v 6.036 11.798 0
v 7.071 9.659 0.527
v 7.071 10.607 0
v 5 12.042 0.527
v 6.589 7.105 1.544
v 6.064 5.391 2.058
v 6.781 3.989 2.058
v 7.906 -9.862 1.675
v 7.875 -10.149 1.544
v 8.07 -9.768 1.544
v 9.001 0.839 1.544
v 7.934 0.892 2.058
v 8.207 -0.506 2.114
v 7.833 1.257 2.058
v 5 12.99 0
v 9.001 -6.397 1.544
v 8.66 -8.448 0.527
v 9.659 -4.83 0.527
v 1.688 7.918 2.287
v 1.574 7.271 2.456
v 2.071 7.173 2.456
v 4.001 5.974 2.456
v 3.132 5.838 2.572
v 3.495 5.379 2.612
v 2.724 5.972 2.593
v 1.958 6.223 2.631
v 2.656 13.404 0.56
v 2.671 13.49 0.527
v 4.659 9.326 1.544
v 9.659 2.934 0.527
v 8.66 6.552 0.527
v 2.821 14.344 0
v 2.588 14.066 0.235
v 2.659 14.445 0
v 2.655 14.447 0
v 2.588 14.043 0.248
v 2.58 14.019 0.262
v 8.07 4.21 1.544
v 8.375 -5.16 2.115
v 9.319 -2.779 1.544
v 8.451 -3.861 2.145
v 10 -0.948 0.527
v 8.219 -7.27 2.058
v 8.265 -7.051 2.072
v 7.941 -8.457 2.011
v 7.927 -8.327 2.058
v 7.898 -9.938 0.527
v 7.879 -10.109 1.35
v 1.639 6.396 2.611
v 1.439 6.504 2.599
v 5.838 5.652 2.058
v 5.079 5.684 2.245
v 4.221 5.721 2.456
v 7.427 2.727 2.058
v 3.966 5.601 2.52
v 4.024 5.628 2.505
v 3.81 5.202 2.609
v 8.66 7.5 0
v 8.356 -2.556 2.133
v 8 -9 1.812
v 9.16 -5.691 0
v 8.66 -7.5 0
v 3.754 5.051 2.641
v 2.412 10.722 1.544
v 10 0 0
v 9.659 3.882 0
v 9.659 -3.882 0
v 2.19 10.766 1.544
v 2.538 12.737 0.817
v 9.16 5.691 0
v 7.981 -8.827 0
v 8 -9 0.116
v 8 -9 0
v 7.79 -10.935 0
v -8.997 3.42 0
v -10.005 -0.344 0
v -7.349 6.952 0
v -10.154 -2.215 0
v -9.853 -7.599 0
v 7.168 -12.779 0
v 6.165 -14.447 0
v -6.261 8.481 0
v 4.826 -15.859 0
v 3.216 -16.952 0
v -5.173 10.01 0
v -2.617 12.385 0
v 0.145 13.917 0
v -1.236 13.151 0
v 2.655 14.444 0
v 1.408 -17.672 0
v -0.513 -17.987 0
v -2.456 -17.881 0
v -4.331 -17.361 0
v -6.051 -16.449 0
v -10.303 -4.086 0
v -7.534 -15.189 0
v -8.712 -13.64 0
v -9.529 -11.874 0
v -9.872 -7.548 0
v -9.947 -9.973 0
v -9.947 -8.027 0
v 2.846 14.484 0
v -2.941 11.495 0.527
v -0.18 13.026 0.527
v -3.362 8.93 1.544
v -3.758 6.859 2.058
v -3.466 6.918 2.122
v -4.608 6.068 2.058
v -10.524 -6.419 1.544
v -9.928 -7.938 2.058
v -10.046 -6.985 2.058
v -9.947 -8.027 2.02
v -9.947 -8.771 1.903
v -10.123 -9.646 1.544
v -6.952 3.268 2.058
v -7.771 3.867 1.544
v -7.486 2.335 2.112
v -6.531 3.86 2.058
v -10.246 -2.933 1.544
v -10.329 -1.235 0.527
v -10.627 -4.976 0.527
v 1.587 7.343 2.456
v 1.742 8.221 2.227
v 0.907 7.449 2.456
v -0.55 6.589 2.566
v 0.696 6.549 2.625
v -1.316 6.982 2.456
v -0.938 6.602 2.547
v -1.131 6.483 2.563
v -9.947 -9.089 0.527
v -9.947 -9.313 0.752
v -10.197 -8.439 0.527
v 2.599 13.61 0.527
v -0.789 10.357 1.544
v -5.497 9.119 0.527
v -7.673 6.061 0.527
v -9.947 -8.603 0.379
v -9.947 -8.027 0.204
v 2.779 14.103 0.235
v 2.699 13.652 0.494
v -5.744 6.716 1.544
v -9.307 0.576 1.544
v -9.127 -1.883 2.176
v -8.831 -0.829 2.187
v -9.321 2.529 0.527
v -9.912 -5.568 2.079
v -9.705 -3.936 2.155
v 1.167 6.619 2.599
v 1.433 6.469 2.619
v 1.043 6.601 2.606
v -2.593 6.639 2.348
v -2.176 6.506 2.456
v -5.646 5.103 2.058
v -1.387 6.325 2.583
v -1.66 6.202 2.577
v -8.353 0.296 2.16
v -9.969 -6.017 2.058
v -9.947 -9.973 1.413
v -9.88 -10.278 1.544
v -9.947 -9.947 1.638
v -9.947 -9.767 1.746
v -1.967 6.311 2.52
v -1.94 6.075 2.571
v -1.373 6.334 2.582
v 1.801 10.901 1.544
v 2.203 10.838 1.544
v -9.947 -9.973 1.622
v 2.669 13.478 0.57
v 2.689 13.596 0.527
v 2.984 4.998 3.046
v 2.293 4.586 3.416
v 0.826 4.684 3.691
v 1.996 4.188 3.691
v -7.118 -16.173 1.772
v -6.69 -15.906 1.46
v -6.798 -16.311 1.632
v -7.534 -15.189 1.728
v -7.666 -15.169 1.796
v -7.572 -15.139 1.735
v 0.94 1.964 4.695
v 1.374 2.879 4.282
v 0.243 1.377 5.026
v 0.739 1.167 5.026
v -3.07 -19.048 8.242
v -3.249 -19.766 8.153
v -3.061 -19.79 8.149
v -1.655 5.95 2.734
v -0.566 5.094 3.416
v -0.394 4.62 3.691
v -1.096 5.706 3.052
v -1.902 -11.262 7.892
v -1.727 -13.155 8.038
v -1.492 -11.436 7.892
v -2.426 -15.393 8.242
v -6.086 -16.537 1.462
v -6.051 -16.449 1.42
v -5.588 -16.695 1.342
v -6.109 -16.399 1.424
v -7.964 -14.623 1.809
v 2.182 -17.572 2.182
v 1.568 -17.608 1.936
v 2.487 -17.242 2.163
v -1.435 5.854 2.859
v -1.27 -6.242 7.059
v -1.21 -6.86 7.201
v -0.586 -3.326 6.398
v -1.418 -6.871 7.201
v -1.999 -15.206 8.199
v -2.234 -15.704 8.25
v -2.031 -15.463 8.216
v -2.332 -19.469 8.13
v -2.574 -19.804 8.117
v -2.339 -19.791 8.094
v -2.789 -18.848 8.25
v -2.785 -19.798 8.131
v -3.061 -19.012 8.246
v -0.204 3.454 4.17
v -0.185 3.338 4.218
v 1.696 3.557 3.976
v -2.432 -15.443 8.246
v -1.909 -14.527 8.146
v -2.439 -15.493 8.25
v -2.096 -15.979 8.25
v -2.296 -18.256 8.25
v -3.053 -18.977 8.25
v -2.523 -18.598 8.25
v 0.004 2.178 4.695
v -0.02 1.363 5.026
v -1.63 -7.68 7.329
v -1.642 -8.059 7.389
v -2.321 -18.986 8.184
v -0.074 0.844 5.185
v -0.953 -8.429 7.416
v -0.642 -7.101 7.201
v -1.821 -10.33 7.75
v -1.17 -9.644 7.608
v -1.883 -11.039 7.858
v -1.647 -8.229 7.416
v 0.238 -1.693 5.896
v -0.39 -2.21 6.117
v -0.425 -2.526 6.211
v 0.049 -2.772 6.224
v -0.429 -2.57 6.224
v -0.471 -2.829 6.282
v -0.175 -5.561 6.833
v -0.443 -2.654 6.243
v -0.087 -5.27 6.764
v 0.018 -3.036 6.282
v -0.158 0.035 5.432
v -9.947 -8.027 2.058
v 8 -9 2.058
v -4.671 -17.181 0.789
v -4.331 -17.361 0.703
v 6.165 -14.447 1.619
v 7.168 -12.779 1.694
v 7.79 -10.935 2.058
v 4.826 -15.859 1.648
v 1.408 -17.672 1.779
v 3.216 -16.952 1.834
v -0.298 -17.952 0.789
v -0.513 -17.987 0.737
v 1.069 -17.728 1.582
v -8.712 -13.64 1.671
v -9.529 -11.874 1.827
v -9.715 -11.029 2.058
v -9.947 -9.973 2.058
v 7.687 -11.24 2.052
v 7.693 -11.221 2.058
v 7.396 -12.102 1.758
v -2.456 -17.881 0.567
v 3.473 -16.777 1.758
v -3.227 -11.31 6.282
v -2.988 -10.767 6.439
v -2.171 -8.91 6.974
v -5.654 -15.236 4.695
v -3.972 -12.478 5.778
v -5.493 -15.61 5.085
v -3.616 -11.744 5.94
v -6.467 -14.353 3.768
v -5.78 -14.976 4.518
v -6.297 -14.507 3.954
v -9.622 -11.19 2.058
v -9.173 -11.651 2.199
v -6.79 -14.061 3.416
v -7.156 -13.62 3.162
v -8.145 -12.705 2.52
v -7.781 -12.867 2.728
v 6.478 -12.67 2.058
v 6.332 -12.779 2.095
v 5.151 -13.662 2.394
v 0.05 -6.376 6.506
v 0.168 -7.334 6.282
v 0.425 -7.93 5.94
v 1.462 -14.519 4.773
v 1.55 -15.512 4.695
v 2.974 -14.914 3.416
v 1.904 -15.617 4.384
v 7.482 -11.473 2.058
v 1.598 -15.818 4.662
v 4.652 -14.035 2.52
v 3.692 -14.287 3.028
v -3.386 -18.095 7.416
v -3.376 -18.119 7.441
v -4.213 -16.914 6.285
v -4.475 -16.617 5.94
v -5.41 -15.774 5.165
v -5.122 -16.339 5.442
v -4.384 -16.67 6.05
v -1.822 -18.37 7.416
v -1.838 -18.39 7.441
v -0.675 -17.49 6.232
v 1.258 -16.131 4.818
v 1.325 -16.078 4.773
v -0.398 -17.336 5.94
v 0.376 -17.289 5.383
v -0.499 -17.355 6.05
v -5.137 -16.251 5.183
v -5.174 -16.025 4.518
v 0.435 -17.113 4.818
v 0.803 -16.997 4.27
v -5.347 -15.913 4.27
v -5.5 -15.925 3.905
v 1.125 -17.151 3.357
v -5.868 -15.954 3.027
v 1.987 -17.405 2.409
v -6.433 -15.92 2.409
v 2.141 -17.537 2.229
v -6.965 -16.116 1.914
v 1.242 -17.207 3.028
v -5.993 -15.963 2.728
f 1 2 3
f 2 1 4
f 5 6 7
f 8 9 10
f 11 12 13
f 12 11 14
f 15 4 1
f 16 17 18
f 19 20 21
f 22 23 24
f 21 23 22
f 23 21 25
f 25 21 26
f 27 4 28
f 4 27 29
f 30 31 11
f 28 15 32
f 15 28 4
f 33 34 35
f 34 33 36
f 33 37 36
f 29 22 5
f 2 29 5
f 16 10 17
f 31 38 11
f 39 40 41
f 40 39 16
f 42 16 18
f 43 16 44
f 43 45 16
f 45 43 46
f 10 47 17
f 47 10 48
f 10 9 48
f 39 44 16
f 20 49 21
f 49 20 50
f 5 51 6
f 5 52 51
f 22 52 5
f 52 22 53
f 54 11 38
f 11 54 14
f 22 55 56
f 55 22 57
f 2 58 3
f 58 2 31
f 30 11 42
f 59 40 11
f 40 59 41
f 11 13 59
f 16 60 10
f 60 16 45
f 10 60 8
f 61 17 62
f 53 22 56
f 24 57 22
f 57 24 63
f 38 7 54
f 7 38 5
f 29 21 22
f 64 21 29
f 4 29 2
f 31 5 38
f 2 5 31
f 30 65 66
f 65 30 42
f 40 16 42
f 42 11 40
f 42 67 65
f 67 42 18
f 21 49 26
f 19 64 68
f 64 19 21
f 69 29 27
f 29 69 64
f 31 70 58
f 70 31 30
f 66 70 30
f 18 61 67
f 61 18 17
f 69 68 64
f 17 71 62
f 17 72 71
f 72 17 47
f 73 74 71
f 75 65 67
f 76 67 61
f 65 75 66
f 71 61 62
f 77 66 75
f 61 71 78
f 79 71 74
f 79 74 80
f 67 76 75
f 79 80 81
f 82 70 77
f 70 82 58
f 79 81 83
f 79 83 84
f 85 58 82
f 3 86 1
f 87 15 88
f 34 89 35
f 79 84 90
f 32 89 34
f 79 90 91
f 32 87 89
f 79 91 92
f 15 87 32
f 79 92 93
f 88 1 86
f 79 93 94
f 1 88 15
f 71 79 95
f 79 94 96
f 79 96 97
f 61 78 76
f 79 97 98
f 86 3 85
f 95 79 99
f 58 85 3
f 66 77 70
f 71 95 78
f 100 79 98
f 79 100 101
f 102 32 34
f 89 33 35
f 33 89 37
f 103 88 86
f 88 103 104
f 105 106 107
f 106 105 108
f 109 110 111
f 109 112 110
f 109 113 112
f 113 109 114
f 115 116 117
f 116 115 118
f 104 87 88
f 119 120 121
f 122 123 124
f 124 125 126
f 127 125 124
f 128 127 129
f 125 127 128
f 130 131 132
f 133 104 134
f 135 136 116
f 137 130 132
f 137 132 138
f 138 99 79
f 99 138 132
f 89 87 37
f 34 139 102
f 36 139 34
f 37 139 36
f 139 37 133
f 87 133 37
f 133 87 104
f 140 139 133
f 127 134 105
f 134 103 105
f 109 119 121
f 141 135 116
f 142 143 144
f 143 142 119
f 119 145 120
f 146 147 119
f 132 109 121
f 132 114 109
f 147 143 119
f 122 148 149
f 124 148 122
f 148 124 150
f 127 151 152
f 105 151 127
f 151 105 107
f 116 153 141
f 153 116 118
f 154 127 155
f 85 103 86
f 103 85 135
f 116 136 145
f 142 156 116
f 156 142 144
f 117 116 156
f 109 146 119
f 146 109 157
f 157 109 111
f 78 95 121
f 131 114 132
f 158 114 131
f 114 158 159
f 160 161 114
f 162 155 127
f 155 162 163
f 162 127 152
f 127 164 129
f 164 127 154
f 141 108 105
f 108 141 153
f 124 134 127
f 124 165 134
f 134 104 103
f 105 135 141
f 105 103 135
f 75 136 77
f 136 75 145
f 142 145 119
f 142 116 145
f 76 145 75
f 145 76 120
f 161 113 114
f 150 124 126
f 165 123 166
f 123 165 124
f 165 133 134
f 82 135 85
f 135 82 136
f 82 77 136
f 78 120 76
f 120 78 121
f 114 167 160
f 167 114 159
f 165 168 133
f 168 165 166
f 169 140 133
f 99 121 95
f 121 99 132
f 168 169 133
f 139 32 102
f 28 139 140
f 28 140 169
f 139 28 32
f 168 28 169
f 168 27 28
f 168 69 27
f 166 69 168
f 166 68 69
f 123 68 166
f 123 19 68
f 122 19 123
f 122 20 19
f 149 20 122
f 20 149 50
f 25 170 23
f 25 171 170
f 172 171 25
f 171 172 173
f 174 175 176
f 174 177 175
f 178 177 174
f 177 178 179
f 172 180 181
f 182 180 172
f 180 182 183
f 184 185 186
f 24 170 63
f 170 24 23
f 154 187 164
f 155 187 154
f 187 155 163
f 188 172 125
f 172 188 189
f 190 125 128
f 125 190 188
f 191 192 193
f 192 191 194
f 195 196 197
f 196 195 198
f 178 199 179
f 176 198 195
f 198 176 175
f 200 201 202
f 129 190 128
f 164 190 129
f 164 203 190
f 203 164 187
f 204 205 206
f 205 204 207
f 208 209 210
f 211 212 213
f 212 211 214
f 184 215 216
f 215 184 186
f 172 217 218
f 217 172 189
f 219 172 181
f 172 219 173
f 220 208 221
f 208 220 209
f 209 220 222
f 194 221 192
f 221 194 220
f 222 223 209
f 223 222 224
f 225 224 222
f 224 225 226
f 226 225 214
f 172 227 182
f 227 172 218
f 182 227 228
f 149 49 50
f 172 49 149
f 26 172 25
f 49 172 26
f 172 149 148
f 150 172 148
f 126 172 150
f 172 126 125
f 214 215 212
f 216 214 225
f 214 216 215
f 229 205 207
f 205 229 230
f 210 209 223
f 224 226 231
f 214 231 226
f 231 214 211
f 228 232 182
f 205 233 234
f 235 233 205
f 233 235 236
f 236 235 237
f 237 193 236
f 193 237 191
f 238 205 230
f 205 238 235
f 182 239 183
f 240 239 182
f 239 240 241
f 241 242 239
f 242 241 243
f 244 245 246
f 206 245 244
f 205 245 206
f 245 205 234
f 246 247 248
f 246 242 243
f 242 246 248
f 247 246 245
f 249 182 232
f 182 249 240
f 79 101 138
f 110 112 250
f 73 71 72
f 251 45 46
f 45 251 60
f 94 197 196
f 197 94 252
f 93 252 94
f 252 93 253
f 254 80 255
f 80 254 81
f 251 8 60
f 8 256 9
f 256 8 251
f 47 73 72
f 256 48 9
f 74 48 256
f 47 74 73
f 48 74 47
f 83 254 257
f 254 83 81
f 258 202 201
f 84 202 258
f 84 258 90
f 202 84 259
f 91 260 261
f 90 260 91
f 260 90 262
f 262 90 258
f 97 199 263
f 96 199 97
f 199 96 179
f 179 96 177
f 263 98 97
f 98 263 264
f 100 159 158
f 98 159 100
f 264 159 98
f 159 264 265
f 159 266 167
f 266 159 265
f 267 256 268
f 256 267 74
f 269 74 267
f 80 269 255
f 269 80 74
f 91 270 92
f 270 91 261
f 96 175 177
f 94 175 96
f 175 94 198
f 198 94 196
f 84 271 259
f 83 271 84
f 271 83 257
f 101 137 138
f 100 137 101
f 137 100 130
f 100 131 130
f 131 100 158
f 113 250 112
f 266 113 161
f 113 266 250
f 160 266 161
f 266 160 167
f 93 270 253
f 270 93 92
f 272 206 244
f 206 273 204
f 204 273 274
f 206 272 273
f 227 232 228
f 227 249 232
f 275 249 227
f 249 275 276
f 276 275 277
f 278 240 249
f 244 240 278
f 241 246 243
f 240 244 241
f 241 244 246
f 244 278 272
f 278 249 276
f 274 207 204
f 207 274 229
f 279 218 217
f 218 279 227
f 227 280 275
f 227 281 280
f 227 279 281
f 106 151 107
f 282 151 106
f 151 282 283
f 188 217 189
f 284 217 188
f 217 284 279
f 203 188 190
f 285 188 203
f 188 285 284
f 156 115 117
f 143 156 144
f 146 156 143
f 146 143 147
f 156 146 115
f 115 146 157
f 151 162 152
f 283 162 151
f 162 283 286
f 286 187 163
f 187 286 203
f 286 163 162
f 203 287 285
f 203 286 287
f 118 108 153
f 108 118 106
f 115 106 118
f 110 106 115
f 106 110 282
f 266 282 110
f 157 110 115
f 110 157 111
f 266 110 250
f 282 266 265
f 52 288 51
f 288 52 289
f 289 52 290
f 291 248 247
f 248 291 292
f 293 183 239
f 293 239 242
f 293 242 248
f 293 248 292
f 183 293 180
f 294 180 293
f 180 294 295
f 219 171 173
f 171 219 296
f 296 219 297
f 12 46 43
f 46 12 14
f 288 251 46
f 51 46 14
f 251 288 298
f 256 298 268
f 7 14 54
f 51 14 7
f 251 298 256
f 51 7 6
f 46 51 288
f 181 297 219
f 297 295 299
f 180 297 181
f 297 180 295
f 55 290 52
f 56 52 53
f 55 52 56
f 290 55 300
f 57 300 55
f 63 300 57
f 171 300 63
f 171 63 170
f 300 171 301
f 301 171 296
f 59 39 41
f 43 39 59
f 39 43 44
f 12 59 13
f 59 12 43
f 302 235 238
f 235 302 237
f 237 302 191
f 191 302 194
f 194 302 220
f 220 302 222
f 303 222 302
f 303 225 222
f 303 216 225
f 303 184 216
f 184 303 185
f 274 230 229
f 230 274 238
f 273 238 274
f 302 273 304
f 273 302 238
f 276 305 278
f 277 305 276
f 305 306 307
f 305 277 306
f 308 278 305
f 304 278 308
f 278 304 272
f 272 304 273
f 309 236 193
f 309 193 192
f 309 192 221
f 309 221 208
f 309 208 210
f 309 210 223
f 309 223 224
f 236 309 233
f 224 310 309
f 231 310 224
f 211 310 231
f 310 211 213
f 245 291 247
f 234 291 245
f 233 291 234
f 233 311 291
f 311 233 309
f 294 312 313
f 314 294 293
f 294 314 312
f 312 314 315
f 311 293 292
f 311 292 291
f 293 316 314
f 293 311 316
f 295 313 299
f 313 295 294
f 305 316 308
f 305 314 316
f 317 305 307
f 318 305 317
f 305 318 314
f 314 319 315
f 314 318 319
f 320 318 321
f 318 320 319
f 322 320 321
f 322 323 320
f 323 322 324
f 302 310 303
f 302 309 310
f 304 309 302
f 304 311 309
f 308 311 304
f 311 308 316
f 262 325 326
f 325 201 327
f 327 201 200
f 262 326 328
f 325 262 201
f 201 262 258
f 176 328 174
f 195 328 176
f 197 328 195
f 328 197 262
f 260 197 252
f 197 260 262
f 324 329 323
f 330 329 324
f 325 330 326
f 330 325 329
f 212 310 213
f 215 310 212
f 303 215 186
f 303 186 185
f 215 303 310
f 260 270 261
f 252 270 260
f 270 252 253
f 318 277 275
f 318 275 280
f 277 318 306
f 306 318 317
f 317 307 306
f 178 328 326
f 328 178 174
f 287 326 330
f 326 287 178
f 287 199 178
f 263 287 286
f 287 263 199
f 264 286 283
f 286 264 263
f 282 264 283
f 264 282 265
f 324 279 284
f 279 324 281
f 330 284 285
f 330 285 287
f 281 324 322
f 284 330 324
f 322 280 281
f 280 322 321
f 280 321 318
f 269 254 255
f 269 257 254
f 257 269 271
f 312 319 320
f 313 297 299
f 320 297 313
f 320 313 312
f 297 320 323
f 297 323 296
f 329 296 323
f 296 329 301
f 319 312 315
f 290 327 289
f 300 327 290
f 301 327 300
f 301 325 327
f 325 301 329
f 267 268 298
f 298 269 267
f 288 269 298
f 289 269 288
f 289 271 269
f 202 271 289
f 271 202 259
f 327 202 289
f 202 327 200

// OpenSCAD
module body0() {

   multmatrix(m = [ [1, 0,    0,   0],
                    [0,  1, -1.8,   0],
                    [0,  0,    1, 0],
                    [0,  0,    0,   1] ])
    resize([20,30,8])
       sphere(r=10,center=true,$fn=24);
}
module body() {
difference() {
	body0();

   translate([0,0,-4])
		cube([60,60,8],center=true);
   translate([0,0,7.3])
		cube([60,60,8],center=true);
   translate([-7,0,0])
      rotate([0,0,-10])
        cube([14,60,10],center=true);
  }
}

module top() {
   multmatrix(m = [ [1, 0,    0,   0],
                    [0,  1, -1.8,   0],
                    [0,  0,    1, 0],
                    [0,  0,    0,   1] ])
    resize([16,28,10.5])
       sphere(r=10,center=true,$fn=24);
}

module scaleblock() {
   rotate([0,0,-10]) translate([0,-8,3]) top();
   translate([-1,-9,1.5])
	   cylinder(r=9,h=3,center=true);
   body();
   translate([0.4,0,0]) mirror([1,0,0] ) rotate([0,0,20]) body();
}

difference() {
	scaleblock();
// Lower large cutouts
	translate([-7,0,10])
      rotate([90,0,-18])
         cylinder(r=8,h=60,center=true);
	translate([7,0,10])
      rotate([90,0,2])
         cylinder(r=8,h=60,center=true);
//Upper large cutouts
	translate([-8,0,13])
      rotate([90,0,-10])
         cylinder(r=9.5,h=60,center=true);
	translate([7.5,0,13])
      rotate([90,0,-5])
         cylinder(r=9.5,h=60,center=true);

   translate([0,0,-4]) cube([50,50,8],center=true);
   translate([0,-21.4,3.8])
     rotate([0,90,-10]) 
       cylinder(r=4.5,h=40,center=true);
   translate([-4,-26,5])
     rotate([0,90,-60]) 
       cylinder(r=4,h=60,center=true);
   translate([-1,-25,5.3])
     rotate([0,90,50]) 
       cylinder(r=4,h=60,center=true);
  }
